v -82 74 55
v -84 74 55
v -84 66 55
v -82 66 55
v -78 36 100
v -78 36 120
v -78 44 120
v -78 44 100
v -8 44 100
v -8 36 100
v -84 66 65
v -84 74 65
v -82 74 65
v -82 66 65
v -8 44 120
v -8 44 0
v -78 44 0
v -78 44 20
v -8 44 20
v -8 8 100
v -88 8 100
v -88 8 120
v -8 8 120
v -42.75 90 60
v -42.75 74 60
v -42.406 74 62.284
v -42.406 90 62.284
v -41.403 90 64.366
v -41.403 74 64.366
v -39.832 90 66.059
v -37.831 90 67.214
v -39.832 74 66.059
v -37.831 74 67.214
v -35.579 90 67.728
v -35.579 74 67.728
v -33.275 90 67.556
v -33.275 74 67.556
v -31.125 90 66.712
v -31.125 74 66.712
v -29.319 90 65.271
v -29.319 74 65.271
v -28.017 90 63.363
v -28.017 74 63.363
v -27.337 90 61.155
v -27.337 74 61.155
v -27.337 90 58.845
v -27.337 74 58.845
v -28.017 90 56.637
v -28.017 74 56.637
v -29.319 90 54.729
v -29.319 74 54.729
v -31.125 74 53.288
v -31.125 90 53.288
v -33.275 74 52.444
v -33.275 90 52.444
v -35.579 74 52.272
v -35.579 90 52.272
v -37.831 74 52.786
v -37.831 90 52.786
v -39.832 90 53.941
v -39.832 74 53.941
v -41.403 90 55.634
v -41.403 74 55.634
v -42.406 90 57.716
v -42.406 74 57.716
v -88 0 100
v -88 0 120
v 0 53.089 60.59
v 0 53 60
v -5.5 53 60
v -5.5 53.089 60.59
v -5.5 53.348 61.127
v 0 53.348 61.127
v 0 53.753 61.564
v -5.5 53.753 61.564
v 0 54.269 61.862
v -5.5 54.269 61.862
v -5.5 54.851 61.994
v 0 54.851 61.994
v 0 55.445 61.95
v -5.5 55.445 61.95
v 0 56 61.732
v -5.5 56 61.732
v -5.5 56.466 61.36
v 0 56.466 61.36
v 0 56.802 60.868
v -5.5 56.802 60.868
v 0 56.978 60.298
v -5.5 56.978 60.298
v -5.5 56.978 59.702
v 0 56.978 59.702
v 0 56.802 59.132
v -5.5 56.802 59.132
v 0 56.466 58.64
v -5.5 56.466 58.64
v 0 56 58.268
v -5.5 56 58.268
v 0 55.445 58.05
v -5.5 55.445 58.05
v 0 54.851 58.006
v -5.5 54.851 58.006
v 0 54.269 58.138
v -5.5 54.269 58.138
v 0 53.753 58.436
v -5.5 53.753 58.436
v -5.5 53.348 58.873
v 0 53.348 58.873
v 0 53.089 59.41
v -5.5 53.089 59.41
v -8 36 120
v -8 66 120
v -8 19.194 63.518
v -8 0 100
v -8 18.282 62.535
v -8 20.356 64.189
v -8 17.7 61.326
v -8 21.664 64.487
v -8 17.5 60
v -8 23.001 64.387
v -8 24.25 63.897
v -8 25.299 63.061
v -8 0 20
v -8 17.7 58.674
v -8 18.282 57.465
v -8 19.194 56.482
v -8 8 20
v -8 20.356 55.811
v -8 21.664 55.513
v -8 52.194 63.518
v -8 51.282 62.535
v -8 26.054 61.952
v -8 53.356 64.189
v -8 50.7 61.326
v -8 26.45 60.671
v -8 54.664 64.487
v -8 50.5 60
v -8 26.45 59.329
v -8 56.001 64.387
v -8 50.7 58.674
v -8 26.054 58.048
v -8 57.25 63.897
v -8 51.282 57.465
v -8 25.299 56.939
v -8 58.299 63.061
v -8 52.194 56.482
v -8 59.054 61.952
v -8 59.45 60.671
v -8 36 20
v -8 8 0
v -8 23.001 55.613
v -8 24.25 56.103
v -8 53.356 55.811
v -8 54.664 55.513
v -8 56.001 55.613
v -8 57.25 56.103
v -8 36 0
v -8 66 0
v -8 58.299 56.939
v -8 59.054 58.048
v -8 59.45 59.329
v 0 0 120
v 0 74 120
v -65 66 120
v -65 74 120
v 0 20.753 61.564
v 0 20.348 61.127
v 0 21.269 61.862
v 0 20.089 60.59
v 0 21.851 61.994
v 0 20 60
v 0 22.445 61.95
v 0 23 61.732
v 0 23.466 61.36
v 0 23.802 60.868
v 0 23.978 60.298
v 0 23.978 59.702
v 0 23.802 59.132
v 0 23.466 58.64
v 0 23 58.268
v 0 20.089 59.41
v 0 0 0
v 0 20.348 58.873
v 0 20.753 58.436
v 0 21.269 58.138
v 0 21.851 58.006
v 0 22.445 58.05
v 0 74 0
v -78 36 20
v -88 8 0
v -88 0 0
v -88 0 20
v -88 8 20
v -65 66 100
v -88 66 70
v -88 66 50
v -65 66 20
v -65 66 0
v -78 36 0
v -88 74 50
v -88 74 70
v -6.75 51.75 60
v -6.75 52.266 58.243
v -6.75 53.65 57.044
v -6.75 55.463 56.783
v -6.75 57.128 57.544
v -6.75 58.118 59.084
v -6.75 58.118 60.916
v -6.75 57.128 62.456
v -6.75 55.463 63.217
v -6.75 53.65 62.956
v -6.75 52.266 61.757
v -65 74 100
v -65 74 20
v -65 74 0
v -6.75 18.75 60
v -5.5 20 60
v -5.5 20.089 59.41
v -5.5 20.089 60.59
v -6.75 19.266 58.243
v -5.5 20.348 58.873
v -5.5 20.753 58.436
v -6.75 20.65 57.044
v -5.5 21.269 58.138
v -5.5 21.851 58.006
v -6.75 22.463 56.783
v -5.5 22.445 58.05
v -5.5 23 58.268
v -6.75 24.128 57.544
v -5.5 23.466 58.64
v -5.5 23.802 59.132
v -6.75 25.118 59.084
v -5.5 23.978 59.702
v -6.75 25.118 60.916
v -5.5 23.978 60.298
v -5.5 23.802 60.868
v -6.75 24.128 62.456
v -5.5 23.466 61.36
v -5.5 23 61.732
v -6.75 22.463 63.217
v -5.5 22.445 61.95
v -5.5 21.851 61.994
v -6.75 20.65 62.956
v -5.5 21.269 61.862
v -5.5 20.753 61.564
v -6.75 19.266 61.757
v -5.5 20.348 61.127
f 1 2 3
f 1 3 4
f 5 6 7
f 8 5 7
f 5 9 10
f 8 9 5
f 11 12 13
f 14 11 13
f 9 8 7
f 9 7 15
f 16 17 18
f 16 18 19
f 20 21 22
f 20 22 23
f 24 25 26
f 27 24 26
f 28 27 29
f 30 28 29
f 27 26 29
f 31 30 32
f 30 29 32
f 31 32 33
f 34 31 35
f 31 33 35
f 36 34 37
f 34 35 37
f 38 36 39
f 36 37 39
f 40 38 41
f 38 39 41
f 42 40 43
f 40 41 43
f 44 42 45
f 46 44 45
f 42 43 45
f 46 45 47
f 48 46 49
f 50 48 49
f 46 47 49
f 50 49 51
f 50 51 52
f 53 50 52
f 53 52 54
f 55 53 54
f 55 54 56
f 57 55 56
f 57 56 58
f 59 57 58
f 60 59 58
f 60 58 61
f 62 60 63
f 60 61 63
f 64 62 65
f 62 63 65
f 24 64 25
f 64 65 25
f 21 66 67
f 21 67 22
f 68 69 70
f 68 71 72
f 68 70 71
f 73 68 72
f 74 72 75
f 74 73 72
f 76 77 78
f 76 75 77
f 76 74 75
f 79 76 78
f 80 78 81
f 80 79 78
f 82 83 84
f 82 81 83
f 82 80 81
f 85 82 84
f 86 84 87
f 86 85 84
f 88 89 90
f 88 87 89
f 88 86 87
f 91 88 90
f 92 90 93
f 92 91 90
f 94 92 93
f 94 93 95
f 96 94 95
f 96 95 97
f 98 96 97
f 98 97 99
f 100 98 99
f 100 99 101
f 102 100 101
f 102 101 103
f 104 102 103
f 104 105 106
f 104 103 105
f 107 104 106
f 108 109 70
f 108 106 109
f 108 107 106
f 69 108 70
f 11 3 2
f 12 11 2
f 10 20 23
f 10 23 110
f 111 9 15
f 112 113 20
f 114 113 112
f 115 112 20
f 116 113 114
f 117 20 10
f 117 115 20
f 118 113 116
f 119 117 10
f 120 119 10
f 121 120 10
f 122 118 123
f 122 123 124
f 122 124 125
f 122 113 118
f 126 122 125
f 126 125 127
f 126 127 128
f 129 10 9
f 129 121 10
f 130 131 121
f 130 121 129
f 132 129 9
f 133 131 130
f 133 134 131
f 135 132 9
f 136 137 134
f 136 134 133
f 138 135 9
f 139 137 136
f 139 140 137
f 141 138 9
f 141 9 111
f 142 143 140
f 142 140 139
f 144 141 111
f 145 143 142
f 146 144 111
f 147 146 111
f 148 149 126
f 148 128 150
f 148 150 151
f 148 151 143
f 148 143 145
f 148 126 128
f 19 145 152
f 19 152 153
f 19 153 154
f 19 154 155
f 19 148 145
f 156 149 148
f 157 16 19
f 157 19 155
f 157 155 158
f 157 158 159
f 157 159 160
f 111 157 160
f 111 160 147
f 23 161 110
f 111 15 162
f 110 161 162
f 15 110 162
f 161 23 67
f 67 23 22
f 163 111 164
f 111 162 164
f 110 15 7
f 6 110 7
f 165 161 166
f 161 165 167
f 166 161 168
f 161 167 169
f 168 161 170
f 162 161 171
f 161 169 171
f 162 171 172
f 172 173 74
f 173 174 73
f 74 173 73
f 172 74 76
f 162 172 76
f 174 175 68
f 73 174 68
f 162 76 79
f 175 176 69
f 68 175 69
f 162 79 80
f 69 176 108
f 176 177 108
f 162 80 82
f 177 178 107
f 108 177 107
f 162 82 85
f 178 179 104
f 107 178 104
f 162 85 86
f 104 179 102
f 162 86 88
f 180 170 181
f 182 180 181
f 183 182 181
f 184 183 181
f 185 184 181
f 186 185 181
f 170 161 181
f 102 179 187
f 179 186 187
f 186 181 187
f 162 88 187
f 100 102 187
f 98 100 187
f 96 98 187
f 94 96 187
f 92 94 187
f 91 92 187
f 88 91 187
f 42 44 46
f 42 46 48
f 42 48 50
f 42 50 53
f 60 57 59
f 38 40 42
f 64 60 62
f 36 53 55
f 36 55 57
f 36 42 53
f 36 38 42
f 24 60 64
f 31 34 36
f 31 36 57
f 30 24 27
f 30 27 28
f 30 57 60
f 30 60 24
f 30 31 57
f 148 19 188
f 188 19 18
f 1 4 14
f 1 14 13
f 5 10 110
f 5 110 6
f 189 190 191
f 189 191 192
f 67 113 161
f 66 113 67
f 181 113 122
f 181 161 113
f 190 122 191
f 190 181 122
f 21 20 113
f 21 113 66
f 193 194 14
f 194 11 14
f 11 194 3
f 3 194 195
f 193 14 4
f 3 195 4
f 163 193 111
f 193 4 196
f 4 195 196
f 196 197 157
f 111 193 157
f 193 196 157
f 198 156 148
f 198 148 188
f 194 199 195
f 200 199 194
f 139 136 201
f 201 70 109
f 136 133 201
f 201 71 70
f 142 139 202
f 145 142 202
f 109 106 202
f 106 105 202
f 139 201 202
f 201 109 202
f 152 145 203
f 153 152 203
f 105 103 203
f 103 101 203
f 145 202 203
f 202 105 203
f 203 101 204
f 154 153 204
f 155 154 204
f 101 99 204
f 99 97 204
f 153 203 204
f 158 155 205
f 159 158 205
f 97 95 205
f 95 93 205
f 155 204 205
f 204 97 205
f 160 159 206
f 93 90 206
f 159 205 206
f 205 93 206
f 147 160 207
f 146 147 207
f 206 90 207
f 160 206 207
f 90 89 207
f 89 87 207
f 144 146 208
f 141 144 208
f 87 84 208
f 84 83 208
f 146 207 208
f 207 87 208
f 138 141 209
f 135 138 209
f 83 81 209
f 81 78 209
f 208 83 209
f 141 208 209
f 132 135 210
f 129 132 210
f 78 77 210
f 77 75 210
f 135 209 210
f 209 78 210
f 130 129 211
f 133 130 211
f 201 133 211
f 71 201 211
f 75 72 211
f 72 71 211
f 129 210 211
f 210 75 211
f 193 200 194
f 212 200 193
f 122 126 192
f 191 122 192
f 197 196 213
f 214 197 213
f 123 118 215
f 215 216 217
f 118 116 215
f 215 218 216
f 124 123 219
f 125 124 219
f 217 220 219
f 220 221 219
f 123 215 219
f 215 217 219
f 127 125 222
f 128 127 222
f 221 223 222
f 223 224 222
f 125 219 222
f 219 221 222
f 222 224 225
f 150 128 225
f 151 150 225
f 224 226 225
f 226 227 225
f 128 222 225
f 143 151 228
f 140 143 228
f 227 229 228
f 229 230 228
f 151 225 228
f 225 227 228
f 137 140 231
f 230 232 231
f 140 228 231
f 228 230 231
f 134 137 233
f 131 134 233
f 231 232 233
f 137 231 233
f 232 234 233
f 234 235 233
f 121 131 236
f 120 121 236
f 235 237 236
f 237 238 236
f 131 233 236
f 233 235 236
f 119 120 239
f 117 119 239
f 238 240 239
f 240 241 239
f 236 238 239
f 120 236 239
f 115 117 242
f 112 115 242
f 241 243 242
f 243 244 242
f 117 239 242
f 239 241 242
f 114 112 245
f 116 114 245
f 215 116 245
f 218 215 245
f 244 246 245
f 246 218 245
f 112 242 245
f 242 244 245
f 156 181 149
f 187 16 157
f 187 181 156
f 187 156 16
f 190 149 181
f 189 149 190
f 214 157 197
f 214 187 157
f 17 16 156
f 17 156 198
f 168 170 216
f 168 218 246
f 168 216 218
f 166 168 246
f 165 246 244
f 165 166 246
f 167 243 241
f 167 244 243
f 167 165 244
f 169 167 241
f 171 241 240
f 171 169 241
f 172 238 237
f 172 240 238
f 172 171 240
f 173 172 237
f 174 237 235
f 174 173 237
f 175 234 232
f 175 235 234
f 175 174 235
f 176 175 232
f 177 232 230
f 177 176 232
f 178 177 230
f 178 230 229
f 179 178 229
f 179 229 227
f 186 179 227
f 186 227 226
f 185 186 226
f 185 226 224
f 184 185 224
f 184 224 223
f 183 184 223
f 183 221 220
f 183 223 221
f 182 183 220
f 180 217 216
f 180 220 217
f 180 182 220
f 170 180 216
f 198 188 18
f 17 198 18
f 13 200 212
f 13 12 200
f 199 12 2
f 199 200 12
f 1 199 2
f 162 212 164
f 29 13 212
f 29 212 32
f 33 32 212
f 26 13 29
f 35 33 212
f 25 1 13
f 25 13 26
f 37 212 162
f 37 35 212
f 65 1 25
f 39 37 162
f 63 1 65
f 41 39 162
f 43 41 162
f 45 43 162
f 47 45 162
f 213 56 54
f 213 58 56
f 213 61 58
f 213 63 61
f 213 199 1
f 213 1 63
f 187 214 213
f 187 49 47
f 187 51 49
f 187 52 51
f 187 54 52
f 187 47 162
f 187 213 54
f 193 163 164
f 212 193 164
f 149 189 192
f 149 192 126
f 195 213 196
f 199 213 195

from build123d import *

# Parameters (mm, degrees)
SKETCH005_R         = 2
EXTRUDE002_DEPTH    = 20
SKETCH002_R         = 7.75
EXTRUDE_DEPTH       = 16
BOX_W               = 8
BOX_H               = 74
BOX_DEPTH           = 120
PAD001_DEPTH        = 20
PAD_DEPTH           = 20
HOLE_D              = 4.4
HOLE_CBORE_D        = 8
HOLE_CBORE_DEPTH    = 2.4
HOLE001_D           = 1.75
HOLE001_CBORE_D     = 3.2
HOLE001_CBORE_DEPTH = 0.96
BOX001_W            = 65
BOX001_H            = 8
BOX001_DEPTH        = 120
BOX002_W            = 2
BOX002_H            = 10
BOX002_DEPTH        = 10
EXTRUDE001_DEPTH    = 8
CHAMFER_SIZE        = 2.5


with BuildPart() as extrude002:
    # Sketch005 (on Face21 of Fusion001) → Extrude002 (new body)
    with BuildSketch(Plane(origin=(-8, 0, 0), x_dir=(0, -1, 0), z_dir=(-1, 0, 0))):
        with Locations((-55, 60)):
            Circle(SKETCH005_R)
        with Locations((-22, 60)):
            Circle(SKETCH005_R)
    extrude(amount=EXTRUDE002_DEPTH)


with BuildPart() as extrude002_1:
    # Extrude002 placement: moved
    add(extrude002.part.moved(Location((16, 0, 0))))


with BuildPart() as extrude_body:
    # Sketch002 (on Face9 of Fusion) → Extrude (new body)
    with BuildSketch(Plane(origin=(0, 74, 0), x_dir=(-1, 0, 0), z_dir=(0, 1, 0))):
        with Locations((35, 60)):
            Circle(SKETCH002_R)
    extrude(amount=EXTRUDE_DEPTH)


with BuildPart() as cube:
    # Box → Box (new body)
    with BuildSketch(Plane(origin=(-8, 0, 0), x_dir=(1, 0, 0), z_dir=(0, 0, 1))):
        with Locations((4, 37)):
            Rectangle(BOX_W, BOX_H)
    extrude(amount=BOX_DEPTH)


with BuildPart() as body001:
    # Sketch001 → Pad001 (new body)
    with BuildSketch(Plane.XY):
        Polygon((-88, 8), (-8, 8), (-8, 36), (-78, 36), (-78, 44), (-8, 44), (-8, 66), (-65, 66), (-65, 74), (0, 74), (0, 0), (-88, 0), align=None)
    extrude(amount=PAD001_DEPTH)


with BuildPart() as body001_1:
    # Body001 placement: moved
    add(body001.part.moved(Location((0, 0, 100))))


with BuildPart() as body:
    # Sketch → Pad (new body)
    with BuildSketch(Plane.XY):
        Polygon((-88, 8), (-8, 8), (-8, 36), (-78, 36), (-78, 44), (-8, 44), (-8, 66), (-65, 66), (-65, 74), (0, 74), (0, 0), (-88, 0), align=None)
    extrude(amount=PAD_DEPTH)

    # Hole (through all)
    with Locations(Plane(origin=(-8, 0, 0), x_dir=(0, -1, 0), z_dir=(-1, 0, 0))):
        with Locations((-55, 60), (-22, 60)):
            CounterBoreHole(HOLE_D / 2, HOLE_CBORE_D / 2, HOLE_CBORE_DEPTH)

    # Hole001 (through all)
    with Locations(Plane(origin=(-8, 0, 0), x_dir=(0, -1, 0), z_dir=(-1, 0, 0))):
        with Locations((-55, 60), (-22, 60)):
            CounterBoreHole(HOLE001_D / 2, HOLE001_CBORE_D / 2, HOLE001_CBORE_DEPTH)


with BuildPart() as fusion:
    # Box001 → Box001 (new body)
    with BuildSketch(Plane(origin=(-65, 66, 0), x_dir=(1, 0, 0), z_dir=(0, 0, 1))):
        with Locations((32.5, 4)):
            Rectangle(BOX001_W, BOX001_H)
    extrude(amount=BOX001_DEPTH)

    # Fusion: union Cube, Body001, Body
    add(cube.part)
    add(body001_1.part)
    add(body.part)


with BuildPart() as cube002:
    # Box002 → Box002 (new body)
    with BuildSketch(Plane(origin=(-84, 64, 55), x_dir=(1, 0, 0), z_dir=(0, 0, 1))):
        with Locations((1, 5)):
            Rectangle(BOX002_W, BOX002_H)
    extrude(amount=BOX002_DEPTH)


with BuildPart() as chamfer_body:
    # Sketch003 (on Face9 of Fusion) → Extrude001 (new body)
    with BuildSketch(Plane(origin=(0, 74, 0), x_dir=(-1, 0, 0), z_dir=(0, 1, 0))):
        Polygon((65, 100), (65, 20), (88, 50), (88, 70), align=None)
    extrude(amount=-EXTRUDE001_DEPTH)

    # Cut: cut Cube002
    add(cube002.part, mode=Mode.SUBTRACT)

    # Fusion001: union Extrude body, Fusion
    add(extrude_body.part)
    add(fusion.part)

    # Cut001: cut Extrude002
    add(extrude002_1.part, mode=Mode.SUBTRACT)

    # Chamfer
    chamfer_edges = [chamfer_body.edges().sort_by_distance(p)[0] for p in [
        (-8, 24, 60),
        (-8, 57, 60),
    ]]
    chamfer(chamfer_edges, length=CHAMFER_SIZE)


solid = chamfer_body.part
